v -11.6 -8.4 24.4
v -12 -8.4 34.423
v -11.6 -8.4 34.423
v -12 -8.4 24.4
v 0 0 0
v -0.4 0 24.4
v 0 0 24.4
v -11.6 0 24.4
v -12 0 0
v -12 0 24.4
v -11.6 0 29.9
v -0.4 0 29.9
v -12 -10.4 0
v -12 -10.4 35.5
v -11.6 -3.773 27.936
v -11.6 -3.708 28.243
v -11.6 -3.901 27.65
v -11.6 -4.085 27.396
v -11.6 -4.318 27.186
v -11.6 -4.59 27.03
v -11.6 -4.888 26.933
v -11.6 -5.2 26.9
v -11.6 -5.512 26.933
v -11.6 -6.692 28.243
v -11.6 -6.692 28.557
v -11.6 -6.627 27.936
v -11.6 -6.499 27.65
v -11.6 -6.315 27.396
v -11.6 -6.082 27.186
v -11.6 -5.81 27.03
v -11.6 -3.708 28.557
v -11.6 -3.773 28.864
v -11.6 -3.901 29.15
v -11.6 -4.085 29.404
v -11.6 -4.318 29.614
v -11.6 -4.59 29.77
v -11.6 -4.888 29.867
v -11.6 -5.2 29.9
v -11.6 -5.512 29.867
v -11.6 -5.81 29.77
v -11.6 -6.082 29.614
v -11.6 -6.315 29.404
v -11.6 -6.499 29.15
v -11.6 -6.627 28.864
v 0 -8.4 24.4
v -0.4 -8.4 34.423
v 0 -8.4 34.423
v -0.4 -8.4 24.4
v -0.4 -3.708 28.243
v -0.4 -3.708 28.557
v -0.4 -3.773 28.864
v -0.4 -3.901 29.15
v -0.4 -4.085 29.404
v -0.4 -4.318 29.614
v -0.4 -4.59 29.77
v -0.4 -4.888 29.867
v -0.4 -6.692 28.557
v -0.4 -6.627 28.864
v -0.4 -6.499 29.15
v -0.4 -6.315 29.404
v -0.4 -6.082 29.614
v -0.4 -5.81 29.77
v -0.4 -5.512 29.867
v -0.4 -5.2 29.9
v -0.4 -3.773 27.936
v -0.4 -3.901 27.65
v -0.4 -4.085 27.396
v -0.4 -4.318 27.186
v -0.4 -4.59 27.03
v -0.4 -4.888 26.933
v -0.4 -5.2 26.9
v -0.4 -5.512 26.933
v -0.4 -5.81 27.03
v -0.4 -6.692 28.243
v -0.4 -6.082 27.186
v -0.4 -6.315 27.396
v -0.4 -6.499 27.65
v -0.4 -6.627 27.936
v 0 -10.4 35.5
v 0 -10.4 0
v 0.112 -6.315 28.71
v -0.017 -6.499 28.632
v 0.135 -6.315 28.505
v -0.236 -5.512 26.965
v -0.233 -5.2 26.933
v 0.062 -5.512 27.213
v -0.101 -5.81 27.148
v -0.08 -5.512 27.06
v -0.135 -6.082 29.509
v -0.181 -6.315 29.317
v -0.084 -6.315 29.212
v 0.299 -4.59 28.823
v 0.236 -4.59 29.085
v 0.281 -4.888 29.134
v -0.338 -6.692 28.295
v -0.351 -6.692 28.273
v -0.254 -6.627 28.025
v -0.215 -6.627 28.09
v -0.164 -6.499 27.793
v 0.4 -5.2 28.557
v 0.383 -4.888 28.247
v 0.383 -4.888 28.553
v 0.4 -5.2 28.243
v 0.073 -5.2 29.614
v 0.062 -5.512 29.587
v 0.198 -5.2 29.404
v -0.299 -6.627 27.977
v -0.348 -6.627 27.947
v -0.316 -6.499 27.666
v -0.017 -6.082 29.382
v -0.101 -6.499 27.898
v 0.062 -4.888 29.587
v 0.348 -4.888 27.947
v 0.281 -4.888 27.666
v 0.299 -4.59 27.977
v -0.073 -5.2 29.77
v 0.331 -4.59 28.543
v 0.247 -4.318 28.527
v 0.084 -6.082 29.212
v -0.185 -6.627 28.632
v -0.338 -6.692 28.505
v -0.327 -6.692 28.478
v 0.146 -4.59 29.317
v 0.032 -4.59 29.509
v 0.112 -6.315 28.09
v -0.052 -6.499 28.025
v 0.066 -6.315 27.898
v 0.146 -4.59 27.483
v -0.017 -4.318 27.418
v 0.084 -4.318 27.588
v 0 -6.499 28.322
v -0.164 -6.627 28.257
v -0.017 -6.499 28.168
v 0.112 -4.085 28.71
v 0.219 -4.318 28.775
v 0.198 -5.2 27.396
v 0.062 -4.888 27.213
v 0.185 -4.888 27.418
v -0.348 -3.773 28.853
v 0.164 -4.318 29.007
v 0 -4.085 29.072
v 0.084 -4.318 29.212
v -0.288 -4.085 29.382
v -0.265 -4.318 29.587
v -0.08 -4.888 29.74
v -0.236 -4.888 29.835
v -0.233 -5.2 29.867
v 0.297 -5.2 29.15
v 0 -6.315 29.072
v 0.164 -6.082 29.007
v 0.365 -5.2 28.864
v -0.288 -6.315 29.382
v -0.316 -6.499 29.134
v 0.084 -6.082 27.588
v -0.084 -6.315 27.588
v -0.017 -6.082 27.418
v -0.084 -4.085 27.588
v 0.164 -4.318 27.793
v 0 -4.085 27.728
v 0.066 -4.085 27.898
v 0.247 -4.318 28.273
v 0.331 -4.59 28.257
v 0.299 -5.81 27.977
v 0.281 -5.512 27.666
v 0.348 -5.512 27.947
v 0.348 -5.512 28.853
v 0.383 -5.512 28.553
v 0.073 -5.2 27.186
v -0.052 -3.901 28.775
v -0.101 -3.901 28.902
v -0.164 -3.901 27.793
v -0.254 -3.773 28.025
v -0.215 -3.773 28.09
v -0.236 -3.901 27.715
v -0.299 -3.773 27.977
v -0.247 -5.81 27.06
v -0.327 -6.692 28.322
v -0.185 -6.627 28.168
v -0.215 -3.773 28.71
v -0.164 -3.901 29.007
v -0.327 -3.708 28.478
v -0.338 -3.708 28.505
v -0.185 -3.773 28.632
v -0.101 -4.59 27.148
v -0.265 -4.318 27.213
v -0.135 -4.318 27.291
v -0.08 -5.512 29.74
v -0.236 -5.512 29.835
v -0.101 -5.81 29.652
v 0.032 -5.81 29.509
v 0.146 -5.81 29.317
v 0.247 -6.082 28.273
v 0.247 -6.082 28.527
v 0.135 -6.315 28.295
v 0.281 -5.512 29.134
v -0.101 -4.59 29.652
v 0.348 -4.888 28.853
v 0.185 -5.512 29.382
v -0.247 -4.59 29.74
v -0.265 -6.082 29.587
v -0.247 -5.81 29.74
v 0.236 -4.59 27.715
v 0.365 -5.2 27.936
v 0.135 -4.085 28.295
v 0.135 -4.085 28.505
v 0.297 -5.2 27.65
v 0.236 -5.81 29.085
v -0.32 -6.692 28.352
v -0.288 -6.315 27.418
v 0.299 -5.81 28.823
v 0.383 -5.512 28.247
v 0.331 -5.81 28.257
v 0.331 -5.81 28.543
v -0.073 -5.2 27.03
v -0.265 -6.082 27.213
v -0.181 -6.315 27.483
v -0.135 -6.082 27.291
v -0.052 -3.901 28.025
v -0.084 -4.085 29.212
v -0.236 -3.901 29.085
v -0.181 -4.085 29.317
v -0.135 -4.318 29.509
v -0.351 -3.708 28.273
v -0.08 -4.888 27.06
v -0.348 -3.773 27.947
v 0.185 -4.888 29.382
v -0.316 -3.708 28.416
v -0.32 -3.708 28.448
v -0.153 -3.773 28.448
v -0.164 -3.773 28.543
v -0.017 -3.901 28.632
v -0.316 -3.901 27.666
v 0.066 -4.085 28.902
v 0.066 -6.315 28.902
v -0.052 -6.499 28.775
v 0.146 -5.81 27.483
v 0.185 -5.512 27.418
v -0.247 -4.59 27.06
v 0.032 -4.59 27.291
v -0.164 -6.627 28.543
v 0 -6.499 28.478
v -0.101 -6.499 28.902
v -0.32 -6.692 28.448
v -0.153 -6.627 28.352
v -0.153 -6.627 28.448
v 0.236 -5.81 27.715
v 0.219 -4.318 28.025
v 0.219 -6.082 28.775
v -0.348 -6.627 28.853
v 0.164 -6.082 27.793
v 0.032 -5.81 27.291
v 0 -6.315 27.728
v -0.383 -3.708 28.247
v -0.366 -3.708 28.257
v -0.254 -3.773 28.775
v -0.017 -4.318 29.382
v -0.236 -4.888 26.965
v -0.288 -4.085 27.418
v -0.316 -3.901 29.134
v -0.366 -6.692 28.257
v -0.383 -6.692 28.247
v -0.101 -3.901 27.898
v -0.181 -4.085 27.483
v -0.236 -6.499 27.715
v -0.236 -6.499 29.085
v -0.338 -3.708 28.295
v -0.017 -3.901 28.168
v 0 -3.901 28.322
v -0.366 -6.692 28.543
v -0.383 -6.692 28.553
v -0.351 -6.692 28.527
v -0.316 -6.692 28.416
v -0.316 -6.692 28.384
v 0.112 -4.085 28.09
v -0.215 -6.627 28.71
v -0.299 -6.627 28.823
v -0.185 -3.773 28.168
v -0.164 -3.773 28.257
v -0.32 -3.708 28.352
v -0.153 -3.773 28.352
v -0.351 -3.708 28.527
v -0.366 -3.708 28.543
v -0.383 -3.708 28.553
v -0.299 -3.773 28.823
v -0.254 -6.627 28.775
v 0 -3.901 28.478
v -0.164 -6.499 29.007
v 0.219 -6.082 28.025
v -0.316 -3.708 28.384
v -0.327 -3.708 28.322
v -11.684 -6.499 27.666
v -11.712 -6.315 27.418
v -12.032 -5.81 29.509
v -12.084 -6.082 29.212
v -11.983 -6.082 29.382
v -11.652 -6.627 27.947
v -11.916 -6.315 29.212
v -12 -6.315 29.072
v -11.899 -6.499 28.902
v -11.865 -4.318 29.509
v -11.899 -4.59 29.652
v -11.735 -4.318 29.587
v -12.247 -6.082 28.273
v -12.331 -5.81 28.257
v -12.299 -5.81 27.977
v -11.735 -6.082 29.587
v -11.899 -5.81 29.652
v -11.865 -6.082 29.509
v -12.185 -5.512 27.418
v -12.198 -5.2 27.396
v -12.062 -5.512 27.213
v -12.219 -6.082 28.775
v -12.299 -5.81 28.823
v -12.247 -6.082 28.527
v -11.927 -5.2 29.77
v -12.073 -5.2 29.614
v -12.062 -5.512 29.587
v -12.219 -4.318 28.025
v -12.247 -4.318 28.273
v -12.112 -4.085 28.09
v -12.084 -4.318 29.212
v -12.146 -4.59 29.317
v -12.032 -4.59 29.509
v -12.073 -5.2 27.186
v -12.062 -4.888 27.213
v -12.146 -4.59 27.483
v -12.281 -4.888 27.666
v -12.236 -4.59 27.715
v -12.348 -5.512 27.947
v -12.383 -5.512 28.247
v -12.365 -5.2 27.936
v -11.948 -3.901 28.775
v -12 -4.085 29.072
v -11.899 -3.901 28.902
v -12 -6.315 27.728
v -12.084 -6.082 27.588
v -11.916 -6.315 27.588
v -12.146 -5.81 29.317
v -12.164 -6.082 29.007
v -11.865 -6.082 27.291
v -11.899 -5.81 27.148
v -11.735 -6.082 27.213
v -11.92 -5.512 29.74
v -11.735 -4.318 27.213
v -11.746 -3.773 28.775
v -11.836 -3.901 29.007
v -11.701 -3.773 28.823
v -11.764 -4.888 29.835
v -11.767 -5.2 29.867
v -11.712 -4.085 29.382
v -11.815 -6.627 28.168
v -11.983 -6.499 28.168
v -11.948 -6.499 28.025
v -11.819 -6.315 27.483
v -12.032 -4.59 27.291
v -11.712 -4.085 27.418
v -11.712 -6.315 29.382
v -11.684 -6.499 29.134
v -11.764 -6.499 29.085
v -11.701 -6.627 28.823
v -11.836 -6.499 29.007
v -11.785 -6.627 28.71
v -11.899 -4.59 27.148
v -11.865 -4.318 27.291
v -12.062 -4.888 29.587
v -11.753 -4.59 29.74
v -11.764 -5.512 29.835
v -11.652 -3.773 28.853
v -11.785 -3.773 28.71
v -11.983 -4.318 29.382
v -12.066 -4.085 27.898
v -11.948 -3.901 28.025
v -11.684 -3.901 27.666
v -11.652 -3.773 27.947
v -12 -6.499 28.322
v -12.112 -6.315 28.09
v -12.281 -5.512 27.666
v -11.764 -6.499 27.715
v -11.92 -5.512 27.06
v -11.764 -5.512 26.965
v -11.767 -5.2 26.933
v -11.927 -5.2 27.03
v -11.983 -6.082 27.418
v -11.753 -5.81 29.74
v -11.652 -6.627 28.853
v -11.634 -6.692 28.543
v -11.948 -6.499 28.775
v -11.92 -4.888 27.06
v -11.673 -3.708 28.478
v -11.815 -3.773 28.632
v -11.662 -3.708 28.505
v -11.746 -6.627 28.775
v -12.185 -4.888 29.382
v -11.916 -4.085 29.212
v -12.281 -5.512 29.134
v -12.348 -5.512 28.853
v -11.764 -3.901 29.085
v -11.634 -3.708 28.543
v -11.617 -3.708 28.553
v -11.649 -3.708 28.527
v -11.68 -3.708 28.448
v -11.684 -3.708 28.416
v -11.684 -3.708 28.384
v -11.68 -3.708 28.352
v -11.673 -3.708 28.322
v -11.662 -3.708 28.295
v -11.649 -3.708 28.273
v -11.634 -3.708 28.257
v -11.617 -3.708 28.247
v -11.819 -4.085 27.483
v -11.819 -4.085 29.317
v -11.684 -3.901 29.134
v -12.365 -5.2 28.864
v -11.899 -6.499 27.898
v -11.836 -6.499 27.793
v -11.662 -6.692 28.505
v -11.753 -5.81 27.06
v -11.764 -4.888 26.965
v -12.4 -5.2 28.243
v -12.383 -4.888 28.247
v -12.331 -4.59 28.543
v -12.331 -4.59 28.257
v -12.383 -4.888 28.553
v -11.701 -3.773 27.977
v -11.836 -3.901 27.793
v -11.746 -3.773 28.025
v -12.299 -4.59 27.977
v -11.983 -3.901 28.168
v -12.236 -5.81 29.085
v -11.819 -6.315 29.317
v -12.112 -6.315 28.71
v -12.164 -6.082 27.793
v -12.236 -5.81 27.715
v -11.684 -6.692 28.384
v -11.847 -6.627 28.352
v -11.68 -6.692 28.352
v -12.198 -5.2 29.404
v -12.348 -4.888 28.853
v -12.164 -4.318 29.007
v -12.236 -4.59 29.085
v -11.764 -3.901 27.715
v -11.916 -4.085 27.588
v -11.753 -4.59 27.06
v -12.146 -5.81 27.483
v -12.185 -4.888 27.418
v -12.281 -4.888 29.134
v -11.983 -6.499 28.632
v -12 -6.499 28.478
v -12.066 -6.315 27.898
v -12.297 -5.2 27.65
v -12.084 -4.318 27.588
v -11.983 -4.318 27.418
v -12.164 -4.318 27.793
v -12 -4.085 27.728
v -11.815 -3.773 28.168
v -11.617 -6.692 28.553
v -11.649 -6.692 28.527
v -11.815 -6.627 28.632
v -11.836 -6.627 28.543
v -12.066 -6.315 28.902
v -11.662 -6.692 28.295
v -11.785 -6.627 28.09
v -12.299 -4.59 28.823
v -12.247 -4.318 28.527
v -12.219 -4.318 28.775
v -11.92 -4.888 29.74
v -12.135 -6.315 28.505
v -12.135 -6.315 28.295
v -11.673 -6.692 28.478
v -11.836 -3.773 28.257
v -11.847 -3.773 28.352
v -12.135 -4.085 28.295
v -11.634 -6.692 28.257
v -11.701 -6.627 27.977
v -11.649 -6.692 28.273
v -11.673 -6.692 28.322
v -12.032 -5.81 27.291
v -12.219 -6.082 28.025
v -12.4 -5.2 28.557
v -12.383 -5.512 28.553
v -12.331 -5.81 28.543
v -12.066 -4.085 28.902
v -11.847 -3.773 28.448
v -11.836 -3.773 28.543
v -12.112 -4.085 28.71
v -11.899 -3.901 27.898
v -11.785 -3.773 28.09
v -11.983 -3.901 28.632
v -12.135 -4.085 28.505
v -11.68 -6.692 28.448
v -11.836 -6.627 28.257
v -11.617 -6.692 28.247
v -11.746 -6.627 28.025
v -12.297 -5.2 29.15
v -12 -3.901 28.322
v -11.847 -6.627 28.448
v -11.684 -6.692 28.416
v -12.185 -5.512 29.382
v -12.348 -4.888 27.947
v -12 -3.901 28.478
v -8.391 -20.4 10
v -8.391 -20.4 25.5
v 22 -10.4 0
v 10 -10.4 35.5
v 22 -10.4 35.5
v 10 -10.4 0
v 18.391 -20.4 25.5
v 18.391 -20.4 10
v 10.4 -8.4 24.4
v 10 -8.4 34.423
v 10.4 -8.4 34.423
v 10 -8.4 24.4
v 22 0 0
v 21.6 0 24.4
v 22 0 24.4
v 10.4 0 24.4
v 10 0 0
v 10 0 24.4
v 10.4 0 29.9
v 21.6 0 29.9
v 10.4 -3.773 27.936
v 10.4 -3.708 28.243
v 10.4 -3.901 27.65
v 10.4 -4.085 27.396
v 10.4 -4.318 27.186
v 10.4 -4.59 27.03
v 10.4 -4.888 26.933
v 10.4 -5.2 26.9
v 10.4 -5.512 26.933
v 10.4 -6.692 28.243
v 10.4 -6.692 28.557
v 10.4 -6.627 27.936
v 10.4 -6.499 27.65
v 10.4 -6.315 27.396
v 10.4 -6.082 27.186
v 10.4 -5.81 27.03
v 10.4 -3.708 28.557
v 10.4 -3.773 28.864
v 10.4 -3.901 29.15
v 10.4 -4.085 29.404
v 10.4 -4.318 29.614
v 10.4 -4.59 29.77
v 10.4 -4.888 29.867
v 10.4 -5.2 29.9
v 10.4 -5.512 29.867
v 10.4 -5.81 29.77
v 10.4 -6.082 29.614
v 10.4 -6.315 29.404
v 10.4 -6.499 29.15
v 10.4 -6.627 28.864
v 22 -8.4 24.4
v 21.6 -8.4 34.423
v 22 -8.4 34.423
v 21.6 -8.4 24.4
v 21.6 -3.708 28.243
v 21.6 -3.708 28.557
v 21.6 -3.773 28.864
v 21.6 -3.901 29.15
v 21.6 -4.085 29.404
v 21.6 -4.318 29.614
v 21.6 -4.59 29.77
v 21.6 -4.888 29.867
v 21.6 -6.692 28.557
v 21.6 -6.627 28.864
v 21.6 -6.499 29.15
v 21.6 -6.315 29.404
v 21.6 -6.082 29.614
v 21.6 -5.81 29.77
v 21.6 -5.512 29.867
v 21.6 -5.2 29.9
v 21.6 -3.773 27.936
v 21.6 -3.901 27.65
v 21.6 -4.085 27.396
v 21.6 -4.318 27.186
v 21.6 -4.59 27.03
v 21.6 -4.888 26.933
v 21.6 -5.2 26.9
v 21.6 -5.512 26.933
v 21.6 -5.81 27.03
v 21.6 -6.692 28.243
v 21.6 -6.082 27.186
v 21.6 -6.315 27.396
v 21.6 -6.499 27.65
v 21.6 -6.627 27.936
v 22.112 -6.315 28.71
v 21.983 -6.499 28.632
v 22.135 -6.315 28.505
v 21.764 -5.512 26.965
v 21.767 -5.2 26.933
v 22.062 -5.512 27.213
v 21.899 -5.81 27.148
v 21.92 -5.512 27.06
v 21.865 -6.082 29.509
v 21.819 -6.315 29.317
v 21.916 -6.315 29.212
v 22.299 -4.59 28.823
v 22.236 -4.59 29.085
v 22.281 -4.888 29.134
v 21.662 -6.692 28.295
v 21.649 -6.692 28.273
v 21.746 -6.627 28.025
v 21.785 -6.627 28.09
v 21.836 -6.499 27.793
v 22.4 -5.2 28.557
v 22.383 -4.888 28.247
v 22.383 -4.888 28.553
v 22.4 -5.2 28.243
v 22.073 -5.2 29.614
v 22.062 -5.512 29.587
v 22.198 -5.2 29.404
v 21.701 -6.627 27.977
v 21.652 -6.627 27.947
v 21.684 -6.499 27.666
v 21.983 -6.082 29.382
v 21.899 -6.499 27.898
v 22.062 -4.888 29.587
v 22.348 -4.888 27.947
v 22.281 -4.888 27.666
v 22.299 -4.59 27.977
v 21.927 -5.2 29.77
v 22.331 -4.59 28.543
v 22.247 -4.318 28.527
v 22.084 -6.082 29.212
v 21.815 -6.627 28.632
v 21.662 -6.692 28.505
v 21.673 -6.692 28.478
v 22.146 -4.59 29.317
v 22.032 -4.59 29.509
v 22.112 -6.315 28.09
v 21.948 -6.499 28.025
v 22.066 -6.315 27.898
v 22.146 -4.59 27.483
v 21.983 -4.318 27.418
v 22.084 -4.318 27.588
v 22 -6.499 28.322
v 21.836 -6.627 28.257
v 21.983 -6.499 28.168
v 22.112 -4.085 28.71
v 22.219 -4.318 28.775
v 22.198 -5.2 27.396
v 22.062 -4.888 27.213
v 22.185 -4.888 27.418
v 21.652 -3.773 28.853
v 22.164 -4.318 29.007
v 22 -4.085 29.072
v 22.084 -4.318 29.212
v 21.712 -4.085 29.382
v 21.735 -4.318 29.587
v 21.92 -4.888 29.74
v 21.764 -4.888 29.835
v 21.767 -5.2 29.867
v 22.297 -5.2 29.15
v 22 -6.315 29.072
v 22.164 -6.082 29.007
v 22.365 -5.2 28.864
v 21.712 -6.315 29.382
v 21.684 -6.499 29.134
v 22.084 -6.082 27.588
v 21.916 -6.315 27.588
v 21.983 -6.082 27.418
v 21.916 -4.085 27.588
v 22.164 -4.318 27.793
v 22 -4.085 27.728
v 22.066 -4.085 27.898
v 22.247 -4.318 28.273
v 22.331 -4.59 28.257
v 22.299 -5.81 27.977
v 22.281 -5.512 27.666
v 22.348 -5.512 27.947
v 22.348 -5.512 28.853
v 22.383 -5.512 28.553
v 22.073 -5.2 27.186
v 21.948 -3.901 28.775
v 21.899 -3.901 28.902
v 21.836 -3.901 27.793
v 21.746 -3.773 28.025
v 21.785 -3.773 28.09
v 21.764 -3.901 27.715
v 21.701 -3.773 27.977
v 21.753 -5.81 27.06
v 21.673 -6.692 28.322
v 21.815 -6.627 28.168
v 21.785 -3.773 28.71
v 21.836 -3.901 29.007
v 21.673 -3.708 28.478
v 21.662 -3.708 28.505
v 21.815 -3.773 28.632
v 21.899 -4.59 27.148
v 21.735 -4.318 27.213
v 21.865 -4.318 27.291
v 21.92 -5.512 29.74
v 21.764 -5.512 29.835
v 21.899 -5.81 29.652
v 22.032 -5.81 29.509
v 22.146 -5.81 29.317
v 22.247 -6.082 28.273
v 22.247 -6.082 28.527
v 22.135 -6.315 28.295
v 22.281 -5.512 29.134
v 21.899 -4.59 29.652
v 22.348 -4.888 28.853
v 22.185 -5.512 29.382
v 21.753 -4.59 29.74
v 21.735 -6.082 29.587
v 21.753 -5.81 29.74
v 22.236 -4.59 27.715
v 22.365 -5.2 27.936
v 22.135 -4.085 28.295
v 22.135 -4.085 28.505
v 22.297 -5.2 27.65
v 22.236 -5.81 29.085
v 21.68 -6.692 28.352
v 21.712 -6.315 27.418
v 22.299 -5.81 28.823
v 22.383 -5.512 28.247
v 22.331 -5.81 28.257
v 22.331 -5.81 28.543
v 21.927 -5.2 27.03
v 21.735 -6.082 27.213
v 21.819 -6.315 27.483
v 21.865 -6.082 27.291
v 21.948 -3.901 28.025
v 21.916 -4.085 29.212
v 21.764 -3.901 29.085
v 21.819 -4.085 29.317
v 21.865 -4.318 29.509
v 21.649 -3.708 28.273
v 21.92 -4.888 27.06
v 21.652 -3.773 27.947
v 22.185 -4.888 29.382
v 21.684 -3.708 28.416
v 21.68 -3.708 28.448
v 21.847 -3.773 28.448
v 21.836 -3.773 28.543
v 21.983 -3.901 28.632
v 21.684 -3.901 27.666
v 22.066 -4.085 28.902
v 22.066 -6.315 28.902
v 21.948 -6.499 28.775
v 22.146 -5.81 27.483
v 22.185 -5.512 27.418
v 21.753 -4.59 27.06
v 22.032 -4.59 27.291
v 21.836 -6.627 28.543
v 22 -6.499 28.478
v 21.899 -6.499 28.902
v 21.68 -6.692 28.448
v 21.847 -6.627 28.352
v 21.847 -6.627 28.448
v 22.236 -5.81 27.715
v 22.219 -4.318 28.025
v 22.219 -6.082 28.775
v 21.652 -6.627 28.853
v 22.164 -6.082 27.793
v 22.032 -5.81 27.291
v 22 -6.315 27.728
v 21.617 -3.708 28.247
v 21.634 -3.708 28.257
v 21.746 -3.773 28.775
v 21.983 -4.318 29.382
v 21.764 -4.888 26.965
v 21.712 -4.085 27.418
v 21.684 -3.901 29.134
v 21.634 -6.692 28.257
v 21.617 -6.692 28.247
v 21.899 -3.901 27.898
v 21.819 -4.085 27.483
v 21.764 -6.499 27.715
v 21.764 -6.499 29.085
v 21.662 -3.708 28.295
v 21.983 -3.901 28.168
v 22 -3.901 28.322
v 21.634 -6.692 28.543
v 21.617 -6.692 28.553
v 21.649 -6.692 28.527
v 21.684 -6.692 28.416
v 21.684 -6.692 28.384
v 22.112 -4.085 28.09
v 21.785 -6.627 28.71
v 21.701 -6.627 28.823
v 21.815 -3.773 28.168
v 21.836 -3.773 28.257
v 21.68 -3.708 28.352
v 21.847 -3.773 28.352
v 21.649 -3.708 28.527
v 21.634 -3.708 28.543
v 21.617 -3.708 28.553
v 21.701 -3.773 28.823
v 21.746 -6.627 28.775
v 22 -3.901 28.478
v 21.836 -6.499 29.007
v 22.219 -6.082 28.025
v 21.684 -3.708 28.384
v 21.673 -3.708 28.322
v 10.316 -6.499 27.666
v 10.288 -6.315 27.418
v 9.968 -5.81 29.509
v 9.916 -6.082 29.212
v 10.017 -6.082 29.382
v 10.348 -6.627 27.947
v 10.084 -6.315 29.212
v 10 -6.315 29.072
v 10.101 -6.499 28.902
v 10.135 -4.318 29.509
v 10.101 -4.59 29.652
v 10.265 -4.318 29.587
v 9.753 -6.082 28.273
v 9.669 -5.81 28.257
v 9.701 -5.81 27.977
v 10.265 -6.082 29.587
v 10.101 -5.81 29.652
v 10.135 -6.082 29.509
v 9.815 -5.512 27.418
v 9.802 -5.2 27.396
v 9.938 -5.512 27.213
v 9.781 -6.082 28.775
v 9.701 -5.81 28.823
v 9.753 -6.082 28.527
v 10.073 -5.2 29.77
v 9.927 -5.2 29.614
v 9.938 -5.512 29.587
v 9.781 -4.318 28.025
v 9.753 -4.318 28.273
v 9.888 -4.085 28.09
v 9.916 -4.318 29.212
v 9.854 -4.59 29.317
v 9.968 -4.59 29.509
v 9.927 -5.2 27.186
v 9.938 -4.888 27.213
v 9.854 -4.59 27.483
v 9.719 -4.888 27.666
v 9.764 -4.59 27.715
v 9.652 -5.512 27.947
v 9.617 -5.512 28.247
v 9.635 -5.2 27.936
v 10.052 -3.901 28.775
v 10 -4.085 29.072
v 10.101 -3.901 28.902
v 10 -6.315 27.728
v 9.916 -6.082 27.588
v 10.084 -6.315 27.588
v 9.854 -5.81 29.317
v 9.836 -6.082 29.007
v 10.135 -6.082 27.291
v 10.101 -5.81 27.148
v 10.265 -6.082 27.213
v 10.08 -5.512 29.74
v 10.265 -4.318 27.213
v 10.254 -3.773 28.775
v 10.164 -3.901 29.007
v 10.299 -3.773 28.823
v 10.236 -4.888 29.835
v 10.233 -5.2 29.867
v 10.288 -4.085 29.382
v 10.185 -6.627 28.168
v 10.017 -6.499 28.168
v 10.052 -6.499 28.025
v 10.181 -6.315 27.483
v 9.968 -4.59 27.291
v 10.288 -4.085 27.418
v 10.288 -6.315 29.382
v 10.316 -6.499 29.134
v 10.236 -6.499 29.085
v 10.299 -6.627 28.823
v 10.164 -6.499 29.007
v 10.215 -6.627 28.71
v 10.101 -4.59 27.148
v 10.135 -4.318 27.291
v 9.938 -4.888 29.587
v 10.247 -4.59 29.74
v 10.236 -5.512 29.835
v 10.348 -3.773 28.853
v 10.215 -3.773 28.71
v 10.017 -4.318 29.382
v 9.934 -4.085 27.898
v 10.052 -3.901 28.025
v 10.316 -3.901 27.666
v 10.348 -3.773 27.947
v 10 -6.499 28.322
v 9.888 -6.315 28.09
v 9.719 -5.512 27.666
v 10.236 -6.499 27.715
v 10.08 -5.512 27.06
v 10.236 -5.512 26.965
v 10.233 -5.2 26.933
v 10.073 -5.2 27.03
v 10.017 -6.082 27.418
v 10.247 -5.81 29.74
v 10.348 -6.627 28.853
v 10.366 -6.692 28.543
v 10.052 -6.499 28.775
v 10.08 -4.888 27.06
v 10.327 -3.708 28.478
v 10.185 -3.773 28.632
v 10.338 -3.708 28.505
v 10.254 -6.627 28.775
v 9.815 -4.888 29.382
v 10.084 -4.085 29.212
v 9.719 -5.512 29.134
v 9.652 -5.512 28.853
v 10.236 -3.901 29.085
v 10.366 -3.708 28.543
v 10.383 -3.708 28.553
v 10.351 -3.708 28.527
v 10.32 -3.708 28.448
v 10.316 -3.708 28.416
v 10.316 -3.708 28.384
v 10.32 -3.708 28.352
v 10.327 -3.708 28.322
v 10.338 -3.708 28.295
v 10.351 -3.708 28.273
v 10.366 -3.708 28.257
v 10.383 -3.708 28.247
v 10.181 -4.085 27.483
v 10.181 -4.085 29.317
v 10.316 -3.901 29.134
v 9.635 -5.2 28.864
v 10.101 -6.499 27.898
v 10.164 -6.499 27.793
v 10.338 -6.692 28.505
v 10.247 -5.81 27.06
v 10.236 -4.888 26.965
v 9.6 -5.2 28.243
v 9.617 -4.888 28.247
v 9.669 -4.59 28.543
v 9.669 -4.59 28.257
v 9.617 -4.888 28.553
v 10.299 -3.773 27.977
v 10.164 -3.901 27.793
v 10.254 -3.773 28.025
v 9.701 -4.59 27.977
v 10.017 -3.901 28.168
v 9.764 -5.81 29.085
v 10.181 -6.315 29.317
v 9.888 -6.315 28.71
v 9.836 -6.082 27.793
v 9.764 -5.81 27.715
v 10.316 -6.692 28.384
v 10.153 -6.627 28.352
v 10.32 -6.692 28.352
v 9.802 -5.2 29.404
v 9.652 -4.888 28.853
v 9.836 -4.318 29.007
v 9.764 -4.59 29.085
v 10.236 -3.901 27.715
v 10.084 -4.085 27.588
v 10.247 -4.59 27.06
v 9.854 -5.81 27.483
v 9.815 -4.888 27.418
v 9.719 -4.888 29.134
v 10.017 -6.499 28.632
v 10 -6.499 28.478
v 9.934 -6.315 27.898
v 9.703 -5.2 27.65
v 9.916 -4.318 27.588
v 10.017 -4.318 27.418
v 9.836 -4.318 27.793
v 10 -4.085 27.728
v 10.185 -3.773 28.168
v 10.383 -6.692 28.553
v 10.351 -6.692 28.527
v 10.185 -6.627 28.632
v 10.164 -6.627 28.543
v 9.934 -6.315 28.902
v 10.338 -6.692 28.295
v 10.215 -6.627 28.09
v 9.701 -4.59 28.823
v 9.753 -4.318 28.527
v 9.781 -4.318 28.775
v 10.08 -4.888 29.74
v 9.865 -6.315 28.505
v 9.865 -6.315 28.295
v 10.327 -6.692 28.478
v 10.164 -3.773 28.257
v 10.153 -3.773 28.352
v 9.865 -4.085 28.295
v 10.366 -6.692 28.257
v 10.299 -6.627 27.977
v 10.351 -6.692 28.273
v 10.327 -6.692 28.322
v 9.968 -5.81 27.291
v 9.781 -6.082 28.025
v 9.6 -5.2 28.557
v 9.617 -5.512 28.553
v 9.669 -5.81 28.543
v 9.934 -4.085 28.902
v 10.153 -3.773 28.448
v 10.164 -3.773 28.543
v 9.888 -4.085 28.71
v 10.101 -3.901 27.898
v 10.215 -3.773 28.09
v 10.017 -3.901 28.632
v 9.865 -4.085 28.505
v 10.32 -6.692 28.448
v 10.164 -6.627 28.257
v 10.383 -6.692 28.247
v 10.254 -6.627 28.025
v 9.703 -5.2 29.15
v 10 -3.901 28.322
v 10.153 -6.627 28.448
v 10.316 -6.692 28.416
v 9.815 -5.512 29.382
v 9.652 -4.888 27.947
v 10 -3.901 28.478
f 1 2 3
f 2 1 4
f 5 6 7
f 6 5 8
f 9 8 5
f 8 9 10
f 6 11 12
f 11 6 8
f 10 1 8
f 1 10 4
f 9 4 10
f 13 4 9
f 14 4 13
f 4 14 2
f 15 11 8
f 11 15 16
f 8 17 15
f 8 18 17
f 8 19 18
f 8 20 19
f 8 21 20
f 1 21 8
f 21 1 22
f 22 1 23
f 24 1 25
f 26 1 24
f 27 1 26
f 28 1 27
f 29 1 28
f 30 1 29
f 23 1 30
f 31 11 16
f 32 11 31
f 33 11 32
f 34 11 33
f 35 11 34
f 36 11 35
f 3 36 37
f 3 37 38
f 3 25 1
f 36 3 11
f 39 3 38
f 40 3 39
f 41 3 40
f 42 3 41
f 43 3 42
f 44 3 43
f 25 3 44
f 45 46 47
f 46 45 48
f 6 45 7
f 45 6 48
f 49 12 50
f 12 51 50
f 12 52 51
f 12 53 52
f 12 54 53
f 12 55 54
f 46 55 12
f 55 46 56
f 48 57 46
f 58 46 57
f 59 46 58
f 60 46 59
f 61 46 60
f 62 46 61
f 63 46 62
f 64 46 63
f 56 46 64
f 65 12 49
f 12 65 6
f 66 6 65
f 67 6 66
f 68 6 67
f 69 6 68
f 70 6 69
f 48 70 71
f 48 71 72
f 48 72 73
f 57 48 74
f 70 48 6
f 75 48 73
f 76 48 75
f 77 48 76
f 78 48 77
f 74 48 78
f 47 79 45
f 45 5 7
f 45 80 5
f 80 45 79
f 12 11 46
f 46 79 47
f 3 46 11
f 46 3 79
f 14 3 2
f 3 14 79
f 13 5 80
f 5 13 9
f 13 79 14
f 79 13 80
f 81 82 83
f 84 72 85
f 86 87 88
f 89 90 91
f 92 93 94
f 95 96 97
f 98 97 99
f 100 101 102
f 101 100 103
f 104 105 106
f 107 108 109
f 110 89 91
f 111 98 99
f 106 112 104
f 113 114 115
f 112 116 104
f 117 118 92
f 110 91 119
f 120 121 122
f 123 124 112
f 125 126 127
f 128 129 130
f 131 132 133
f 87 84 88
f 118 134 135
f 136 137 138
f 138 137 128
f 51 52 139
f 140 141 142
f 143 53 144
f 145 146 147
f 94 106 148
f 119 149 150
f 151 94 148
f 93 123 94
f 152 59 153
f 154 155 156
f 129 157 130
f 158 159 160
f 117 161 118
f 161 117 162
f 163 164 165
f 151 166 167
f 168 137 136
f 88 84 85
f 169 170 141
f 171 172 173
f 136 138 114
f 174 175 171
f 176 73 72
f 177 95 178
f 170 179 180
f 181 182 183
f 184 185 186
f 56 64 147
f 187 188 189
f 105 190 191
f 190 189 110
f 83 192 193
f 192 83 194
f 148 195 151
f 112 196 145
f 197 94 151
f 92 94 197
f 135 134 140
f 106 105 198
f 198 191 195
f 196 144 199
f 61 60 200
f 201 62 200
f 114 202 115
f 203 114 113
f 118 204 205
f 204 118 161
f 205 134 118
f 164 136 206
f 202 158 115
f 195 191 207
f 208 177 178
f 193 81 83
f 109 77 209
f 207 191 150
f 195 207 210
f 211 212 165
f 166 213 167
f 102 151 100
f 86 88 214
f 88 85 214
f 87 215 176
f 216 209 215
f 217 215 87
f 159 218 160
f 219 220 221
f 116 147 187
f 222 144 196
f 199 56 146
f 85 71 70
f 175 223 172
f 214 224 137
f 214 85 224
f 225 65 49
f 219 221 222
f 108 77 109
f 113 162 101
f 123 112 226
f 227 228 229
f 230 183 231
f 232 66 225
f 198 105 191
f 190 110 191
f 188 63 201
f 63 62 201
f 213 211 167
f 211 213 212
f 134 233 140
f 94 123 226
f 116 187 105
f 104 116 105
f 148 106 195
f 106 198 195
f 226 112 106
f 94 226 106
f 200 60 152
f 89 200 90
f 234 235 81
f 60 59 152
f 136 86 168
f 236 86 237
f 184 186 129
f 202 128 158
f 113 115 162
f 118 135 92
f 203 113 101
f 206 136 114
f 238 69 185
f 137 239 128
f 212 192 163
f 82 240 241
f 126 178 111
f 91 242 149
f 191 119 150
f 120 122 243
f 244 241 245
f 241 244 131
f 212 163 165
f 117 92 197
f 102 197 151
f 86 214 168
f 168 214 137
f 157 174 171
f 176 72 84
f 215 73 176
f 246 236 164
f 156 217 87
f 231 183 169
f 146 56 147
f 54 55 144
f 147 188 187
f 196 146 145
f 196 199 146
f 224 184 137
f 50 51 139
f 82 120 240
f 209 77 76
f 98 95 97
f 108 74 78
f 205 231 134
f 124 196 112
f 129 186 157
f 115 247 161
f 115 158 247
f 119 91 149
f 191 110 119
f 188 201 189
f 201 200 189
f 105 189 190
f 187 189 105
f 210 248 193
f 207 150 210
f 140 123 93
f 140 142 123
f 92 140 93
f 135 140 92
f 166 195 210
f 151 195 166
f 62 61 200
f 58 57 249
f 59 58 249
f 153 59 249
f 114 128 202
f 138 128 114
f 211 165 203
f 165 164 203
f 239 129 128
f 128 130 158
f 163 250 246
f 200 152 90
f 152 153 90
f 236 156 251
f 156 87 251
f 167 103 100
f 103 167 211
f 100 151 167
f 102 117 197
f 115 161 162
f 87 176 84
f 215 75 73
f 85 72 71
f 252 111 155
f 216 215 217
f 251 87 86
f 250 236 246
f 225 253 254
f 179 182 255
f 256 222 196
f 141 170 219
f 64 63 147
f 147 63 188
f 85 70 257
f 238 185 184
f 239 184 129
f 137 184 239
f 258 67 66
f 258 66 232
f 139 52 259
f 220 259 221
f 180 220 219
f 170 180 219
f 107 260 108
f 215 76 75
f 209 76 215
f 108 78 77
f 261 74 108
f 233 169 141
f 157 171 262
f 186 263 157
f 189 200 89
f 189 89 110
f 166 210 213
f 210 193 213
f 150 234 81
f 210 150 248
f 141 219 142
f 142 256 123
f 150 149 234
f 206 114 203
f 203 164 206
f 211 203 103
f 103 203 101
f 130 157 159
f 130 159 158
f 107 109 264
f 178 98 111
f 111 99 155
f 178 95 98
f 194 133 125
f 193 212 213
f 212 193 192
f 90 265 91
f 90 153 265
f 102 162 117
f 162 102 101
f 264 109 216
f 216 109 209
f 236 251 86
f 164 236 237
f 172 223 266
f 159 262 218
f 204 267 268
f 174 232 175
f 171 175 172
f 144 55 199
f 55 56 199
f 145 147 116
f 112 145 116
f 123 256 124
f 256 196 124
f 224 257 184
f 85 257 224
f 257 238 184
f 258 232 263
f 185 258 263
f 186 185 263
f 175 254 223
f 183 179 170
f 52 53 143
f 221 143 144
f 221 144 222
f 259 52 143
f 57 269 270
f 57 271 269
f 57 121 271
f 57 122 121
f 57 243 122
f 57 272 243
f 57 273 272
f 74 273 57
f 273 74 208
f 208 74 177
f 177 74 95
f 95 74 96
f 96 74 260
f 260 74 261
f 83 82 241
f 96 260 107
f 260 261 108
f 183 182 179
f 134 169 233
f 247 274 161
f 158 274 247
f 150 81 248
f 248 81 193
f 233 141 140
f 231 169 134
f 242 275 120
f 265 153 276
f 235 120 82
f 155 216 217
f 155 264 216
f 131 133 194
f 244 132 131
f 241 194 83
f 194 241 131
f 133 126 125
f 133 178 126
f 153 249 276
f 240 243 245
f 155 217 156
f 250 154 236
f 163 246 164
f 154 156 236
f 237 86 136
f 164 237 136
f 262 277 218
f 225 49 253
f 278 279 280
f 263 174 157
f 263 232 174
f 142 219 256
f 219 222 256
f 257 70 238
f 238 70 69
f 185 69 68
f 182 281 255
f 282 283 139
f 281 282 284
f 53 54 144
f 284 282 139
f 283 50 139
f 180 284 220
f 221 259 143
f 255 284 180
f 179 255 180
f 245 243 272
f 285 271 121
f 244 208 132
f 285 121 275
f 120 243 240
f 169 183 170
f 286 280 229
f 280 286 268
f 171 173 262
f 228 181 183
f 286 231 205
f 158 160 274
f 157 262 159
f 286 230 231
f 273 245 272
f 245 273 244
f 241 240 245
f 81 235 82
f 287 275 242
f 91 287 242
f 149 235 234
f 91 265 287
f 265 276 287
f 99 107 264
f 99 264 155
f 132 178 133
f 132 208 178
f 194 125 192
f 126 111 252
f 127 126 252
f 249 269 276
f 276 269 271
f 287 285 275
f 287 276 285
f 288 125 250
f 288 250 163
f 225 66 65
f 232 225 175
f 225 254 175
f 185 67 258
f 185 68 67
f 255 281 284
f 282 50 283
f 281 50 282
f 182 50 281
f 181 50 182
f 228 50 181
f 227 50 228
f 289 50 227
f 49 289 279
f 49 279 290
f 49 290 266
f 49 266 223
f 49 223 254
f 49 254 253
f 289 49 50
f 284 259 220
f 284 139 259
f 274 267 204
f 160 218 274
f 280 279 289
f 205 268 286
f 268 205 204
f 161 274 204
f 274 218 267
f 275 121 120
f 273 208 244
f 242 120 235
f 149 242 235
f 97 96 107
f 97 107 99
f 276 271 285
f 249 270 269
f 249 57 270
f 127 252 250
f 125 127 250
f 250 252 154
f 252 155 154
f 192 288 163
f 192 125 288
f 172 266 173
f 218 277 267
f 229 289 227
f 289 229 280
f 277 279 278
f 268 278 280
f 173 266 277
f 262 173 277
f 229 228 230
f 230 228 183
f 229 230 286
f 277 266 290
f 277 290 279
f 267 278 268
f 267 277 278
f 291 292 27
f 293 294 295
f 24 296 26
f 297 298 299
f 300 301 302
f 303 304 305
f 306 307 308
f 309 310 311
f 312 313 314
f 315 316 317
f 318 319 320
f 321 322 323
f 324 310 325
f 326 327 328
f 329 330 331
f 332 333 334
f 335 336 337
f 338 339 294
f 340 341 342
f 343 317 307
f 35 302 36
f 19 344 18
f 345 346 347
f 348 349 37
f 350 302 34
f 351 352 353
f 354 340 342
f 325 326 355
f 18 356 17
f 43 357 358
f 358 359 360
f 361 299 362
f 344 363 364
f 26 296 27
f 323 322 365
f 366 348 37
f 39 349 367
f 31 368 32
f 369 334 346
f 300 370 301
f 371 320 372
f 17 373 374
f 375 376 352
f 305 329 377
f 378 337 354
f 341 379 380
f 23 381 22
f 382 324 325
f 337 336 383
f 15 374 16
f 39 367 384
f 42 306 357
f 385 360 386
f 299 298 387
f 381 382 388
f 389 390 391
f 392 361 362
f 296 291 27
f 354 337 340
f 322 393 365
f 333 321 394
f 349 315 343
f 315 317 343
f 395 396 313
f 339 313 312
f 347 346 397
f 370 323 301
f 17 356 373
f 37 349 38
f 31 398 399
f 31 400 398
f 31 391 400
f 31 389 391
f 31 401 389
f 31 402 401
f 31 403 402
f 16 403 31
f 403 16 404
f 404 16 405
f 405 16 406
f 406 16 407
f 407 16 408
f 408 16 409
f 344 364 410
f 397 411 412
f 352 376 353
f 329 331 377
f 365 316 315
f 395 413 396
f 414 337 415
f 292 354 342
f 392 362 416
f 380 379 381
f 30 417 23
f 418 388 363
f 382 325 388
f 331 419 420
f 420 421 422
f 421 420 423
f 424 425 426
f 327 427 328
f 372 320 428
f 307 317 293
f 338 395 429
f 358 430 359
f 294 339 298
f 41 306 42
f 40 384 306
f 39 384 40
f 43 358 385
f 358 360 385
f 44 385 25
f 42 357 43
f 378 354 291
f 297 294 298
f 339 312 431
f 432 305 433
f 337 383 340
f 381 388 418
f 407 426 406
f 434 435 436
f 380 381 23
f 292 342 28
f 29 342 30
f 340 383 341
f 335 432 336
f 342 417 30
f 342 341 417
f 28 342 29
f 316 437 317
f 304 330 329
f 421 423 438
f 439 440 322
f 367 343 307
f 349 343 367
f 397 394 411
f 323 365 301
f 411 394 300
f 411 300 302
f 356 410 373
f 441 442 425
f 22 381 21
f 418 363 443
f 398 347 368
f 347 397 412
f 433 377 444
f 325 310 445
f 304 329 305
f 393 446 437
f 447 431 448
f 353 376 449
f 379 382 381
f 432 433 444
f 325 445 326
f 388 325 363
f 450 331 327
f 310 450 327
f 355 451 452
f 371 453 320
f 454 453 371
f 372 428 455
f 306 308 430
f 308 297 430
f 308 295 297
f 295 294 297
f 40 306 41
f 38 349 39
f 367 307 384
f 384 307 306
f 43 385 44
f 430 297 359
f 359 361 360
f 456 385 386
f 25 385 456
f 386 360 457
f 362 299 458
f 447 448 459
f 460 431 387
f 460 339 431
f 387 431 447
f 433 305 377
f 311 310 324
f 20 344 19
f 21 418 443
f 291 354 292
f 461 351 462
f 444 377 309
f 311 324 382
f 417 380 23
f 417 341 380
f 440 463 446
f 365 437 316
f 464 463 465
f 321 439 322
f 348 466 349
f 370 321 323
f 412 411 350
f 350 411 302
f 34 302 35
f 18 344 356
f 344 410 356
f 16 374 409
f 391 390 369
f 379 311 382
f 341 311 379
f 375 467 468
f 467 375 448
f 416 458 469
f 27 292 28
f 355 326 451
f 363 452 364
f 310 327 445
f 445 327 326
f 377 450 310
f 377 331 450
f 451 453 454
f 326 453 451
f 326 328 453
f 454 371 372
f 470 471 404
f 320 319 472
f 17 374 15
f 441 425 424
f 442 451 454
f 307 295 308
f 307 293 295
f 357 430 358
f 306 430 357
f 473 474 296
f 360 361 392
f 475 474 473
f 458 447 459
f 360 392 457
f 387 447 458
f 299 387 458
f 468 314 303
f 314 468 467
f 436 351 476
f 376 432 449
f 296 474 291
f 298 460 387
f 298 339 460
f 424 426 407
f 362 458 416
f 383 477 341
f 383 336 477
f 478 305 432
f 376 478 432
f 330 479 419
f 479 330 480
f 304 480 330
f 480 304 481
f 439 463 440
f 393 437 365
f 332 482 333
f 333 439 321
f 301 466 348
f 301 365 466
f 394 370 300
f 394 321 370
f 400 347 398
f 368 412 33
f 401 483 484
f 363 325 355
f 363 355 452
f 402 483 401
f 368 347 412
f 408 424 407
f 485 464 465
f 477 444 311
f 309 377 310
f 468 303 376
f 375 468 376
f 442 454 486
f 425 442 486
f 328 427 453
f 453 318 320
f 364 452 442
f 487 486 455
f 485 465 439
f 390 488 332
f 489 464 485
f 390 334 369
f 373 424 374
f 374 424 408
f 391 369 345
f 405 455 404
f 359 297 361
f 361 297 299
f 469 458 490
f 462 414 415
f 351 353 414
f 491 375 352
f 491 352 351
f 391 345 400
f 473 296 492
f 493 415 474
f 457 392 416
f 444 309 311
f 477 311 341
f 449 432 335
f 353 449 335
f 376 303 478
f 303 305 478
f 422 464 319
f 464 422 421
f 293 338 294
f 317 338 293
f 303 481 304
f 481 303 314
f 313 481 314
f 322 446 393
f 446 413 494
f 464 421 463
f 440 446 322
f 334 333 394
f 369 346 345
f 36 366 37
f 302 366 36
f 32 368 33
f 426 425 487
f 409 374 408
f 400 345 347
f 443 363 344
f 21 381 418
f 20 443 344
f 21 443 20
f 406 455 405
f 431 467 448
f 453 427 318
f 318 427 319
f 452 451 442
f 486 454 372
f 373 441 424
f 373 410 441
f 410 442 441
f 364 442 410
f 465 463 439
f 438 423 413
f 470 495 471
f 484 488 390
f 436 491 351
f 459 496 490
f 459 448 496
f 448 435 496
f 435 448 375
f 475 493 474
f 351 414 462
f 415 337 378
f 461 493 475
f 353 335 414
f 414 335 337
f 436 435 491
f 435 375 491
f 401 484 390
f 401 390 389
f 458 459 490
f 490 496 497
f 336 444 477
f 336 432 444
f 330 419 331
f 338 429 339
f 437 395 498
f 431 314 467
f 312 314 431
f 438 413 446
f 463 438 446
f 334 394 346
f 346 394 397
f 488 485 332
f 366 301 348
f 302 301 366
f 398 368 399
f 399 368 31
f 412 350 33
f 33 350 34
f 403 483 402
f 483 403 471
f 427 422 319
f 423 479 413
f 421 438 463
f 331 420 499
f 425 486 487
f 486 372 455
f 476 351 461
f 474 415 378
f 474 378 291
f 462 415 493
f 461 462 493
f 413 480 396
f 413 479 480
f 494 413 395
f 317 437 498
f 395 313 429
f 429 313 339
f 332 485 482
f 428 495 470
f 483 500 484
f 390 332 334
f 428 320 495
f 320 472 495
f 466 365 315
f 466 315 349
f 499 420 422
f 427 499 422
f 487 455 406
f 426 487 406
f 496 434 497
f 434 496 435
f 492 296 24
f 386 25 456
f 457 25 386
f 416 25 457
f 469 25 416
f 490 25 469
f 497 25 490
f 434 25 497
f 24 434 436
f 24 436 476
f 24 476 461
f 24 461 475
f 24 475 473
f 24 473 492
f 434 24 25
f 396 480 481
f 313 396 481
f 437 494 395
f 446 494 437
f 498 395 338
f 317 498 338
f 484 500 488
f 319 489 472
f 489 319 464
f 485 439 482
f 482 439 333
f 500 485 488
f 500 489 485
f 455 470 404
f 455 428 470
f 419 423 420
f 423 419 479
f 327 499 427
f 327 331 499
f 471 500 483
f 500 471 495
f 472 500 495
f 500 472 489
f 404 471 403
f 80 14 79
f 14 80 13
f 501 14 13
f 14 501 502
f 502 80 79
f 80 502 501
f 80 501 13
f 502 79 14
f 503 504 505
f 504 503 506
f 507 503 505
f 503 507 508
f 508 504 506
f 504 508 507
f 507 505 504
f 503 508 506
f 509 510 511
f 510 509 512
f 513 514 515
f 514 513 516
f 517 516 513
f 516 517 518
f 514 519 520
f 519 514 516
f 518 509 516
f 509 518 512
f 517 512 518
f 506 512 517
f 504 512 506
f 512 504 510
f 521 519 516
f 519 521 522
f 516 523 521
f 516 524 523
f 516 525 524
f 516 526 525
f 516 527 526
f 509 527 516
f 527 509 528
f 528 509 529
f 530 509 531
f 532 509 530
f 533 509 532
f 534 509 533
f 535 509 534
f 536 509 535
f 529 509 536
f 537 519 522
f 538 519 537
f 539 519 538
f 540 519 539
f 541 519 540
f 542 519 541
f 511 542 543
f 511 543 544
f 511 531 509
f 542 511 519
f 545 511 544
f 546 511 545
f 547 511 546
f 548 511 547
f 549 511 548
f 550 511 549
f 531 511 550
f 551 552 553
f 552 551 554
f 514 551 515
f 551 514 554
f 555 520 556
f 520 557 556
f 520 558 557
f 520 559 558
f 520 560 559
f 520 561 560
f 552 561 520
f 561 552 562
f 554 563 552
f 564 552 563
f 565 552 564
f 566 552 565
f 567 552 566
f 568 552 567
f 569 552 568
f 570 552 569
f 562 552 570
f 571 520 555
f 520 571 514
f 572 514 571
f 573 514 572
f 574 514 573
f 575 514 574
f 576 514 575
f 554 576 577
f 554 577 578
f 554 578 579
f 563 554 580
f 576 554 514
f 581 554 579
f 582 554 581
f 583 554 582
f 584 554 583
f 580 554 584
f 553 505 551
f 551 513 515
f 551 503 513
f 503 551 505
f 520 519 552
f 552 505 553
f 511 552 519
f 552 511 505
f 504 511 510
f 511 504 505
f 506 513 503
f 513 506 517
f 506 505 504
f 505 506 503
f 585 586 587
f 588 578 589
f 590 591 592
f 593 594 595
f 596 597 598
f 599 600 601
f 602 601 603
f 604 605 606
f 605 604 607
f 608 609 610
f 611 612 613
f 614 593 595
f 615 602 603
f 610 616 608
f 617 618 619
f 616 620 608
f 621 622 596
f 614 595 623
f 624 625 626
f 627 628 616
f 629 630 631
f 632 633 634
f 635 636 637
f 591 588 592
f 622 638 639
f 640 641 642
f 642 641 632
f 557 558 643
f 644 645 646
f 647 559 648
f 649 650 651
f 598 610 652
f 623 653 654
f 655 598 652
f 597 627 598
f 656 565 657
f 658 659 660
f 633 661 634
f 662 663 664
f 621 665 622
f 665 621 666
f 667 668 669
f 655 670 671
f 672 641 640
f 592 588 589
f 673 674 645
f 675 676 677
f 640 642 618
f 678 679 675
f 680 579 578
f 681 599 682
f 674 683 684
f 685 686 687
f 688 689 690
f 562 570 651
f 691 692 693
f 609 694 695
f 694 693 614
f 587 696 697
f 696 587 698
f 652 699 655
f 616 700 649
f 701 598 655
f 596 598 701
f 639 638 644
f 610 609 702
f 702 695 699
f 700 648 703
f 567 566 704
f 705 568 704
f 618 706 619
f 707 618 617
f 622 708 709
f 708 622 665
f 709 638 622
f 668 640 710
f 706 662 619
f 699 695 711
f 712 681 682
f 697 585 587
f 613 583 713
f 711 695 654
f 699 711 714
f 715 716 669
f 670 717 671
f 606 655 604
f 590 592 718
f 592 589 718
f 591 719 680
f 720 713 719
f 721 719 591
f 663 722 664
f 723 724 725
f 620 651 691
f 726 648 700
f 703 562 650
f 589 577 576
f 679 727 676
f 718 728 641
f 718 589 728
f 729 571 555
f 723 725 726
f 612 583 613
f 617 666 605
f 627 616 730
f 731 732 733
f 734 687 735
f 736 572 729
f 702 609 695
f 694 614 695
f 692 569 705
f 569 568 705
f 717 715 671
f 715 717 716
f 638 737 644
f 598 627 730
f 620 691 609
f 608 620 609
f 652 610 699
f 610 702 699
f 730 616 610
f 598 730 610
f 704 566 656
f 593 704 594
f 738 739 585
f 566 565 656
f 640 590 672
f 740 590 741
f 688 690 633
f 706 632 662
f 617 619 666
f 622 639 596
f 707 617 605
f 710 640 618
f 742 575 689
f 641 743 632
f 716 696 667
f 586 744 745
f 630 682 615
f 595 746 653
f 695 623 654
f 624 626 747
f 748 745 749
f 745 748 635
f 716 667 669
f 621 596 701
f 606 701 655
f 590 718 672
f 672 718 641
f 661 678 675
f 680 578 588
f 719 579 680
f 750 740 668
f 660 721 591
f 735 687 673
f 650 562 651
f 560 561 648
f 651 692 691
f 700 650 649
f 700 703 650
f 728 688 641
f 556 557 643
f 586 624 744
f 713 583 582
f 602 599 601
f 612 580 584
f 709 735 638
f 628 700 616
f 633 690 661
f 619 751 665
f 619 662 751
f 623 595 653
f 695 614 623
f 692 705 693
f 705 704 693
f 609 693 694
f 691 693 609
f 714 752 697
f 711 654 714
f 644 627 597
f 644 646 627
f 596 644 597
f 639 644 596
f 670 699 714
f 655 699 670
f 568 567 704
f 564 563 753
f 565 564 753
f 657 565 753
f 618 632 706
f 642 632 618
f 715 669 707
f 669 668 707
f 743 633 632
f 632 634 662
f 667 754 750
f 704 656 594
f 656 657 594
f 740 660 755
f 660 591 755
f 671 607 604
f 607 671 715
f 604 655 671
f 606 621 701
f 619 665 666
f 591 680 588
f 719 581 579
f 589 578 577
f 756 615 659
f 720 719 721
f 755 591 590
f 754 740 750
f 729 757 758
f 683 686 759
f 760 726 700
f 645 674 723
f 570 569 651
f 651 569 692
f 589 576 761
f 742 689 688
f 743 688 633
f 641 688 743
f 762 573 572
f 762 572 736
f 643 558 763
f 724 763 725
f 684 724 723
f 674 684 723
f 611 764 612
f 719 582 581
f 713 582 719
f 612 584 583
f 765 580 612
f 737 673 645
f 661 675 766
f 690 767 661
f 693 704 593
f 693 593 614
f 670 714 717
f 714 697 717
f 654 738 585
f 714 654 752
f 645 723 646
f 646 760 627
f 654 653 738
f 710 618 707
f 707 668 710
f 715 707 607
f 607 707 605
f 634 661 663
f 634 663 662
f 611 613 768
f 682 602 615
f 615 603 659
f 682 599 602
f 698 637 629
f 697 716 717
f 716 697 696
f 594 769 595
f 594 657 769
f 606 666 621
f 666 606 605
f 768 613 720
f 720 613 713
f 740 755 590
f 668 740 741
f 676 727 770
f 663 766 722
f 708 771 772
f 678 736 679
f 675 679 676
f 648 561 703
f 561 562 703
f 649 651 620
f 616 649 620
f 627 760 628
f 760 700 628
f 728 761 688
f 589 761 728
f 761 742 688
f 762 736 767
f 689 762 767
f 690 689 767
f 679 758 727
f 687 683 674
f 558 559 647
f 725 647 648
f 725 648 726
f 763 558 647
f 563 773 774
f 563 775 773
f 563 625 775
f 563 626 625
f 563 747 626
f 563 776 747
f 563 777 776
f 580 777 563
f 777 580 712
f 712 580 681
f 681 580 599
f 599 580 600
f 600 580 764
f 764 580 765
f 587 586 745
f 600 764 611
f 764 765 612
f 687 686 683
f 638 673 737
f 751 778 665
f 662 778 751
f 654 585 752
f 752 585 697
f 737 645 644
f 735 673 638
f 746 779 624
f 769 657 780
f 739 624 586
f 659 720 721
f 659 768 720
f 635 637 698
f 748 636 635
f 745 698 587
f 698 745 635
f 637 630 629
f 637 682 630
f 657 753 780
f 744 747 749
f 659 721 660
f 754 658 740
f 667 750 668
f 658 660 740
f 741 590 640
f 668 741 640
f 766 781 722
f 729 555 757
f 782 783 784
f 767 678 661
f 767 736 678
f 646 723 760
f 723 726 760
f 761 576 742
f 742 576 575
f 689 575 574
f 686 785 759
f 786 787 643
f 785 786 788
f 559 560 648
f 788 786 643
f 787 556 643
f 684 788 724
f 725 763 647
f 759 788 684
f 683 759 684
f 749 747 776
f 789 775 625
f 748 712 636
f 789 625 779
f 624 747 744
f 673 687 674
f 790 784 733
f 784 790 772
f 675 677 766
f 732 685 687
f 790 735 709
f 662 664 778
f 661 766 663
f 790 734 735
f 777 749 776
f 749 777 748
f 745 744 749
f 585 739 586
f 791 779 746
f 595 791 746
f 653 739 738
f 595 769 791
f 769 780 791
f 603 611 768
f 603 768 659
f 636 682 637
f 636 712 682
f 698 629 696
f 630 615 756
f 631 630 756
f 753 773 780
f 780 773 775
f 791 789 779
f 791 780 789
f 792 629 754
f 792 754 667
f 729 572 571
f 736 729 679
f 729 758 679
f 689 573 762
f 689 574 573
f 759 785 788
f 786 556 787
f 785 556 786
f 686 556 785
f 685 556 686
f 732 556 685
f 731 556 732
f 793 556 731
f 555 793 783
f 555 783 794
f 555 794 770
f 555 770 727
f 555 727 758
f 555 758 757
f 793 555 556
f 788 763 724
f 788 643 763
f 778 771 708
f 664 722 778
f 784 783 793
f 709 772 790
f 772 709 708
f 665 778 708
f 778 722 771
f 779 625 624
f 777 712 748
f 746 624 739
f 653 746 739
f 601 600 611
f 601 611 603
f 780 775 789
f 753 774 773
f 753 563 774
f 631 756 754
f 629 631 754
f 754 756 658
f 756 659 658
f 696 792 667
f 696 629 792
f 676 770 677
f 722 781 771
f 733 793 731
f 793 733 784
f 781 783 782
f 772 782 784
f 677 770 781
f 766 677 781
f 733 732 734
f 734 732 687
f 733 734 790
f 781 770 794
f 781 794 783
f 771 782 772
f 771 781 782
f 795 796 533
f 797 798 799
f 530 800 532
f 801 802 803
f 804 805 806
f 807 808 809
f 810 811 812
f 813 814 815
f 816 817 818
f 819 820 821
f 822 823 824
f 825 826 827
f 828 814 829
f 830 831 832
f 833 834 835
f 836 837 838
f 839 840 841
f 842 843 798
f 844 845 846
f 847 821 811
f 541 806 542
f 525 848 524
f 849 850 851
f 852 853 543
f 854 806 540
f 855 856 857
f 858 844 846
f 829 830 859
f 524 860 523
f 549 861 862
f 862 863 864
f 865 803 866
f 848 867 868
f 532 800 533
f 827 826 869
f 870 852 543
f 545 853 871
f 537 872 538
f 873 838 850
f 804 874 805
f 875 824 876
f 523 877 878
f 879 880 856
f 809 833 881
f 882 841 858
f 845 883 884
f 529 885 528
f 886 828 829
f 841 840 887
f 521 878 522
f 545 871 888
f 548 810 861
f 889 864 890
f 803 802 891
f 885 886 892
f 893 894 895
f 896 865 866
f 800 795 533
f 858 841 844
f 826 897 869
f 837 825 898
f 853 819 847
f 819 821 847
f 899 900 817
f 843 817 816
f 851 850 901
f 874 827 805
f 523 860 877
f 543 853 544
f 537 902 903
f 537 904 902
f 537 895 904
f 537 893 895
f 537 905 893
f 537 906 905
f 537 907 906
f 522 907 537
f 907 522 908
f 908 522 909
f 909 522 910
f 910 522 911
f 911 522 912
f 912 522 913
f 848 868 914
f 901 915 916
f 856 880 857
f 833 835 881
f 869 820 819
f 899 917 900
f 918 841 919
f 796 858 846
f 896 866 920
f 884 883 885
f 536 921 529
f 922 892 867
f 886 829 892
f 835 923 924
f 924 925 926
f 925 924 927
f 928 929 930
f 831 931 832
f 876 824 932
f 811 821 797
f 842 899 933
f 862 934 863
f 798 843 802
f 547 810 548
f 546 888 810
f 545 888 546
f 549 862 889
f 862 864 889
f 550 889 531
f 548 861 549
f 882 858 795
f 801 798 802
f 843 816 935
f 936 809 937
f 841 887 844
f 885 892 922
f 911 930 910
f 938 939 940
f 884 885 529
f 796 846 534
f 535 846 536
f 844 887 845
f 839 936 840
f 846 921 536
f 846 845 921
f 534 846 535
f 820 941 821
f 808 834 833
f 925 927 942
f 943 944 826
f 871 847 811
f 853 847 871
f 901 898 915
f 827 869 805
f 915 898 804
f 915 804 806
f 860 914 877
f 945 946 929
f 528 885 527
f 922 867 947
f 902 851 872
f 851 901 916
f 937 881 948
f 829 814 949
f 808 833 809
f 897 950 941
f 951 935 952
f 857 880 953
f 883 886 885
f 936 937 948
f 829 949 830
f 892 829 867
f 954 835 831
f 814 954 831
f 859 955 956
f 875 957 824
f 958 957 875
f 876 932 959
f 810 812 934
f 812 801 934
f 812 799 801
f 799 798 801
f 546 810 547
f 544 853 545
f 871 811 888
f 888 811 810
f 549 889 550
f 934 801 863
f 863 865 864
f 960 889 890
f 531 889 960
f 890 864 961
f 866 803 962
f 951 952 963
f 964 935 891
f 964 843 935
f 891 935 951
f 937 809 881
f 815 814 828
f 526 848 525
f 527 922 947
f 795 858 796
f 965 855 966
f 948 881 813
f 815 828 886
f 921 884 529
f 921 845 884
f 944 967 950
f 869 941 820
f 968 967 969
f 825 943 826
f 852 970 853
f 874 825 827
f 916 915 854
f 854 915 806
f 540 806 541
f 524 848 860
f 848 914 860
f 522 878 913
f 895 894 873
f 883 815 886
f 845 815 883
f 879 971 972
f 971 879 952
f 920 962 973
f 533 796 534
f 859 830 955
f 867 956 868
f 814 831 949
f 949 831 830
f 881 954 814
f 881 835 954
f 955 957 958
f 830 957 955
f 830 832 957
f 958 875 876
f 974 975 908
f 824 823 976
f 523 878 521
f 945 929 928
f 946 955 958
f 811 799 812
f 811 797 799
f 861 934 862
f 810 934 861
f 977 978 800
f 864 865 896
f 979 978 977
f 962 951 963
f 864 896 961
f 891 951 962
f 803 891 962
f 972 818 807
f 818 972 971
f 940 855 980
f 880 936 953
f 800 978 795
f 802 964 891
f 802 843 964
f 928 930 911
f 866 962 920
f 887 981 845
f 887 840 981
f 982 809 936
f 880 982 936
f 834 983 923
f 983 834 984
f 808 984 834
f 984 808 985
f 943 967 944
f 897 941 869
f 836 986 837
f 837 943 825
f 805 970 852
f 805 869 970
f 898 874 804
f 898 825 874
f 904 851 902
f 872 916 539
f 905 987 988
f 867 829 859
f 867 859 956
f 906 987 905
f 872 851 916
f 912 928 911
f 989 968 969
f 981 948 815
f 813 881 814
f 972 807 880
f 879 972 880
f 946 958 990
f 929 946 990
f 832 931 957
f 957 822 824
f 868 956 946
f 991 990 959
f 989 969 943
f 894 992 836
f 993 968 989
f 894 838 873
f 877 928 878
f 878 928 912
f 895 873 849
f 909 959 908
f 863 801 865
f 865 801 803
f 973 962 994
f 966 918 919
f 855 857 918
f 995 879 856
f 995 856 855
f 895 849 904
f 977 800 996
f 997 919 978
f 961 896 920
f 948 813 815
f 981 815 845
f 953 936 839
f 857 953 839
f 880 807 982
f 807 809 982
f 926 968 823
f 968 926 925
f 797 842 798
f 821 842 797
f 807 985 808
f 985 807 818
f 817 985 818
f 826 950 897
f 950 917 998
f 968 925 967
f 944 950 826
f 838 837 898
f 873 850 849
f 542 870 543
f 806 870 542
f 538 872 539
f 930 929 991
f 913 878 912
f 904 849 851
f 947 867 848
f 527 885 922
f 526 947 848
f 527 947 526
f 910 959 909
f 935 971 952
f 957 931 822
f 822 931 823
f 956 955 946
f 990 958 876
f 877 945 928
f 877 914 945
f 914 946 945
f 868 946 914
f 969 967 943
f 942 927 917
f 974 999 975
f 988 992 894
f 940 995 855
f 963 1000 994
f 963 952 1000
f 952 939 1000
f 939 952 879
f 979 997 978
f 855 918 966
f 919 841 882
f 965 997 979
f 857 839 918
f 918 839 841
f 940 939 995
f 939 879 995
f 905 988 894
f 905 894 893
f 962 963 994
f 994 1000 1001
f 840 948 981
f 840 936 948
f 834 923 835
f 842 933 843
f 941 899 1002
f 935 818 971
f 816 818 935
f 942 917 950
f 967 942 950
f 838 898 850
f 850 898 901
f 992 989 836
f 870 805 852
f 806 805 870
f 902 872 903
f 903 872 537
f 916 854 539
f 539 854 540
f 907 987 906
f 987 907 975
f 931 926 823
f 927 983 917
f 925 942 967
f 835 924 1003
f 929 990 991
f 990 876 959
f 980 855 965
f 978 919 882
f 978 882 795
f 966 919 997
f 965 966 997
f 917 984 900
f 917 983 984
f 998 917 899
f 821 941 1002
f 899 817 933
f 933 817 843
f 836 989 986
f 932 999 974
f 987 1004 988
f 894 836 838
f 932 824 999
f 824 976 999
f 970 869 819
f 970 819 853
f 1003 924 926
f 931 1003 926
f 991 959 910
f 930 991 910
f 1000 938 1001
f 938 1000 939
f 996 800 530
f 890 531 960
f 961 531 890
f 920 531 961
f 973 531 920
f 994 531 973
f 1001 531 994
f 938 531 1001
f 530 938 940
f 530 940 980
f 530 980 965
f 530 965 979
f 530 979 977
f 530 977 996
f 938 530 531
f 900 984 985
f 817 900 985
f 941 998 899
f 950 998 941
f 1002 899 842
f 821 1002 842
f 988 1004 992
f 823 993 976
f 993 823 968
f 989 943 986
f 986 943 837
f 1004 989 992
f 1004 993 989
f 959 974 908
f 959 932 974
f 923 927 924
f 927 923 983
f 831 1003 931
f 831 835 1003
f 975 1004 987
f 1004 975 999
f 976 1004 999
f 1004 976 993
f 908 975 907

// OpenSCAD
block_angle_height = 10;
block_angle_measure = 50;
block_angle_chamfer = 45;
block_inset_length_0 = 29.9;
block_inset_length_1 = 35.5;
block_inset_depth = 10.4;
block_inset_width = 12;
block_burr_radius = 1.5;
block_burr_depth = 0.8;
block_sink_depth = 0.4;
block_sink_margin_sides = 4;
block_sink_margin_top = 2;

module block_burr() {
  resize([0, block_burr_depth * 2, 0])
    sphere(block_burr_radius, $fn=30);
}

module block_sink() {
  cube([100, block_sink_depth, block_inset_depth - block_sink_margin_top]);
}


module block_inset() {
  union() {
    difference() {
      translate([0, block_inset_width, 0]) rotate([90, 0, 0])
        linear_extrude(block_inset_width) polygon([
          [0, 0],
          [block_inset_length_0, 0],
          [block_inset_length_1, block_inset_depth],
          [0, block_inset_depth]
        ]);

      translate([block_inset_length_0 - block_sink_margin_sides - block_burr_radius, 0, 0]) {
        translate([0, block_inset_width - block_sink_depth, 0])
          block_sink();
      
        block_sink();
      }
    }

    translate([block_inset_length_0 - block_burr_radius, 0, block_inset_depth / 2]) {
      translate([0, block_sink_depth, 0])
        block_burr();

      translate([0, block_inset_width - block_sink_depth, 0])
        block_burr();
    }
  }
}

module block_angle() {
  difference() {
    rotate([90, 0, 90])
      linear_extrude(block_inset_length_1) polygon([
        [0, 0],
        [block_inset_width, 0],
        [block_angle_height / tan(block_angle_measure), block_angle_height]
      ]);

    rotate([0, block_angle_chamfer, 0]) translate([-100, 0, 0])
      cube([100, block_inset_width, 100]);

    translate([block_inset_length_1, 0, 0]) rotate([0, -block_angle_chamfer, 0])
      cube([100, block_inset_width, 100]);
  }
}

module block(orientation) {
  union() {
    if (orientation == "right")
      rotate([0, 0, 180]) translate([-block_inset_length_1, -block_inset_width, 0])
        block_inset();
    else
      block_inset();

    translate([0, 0, block_inset_depth])
      block_angle();
  }
}

rotate([0, -90, 90])
  block("left");

translate([10, 0, block_inset_length_1]) rotate([0, -270, -90])
  block("right");
